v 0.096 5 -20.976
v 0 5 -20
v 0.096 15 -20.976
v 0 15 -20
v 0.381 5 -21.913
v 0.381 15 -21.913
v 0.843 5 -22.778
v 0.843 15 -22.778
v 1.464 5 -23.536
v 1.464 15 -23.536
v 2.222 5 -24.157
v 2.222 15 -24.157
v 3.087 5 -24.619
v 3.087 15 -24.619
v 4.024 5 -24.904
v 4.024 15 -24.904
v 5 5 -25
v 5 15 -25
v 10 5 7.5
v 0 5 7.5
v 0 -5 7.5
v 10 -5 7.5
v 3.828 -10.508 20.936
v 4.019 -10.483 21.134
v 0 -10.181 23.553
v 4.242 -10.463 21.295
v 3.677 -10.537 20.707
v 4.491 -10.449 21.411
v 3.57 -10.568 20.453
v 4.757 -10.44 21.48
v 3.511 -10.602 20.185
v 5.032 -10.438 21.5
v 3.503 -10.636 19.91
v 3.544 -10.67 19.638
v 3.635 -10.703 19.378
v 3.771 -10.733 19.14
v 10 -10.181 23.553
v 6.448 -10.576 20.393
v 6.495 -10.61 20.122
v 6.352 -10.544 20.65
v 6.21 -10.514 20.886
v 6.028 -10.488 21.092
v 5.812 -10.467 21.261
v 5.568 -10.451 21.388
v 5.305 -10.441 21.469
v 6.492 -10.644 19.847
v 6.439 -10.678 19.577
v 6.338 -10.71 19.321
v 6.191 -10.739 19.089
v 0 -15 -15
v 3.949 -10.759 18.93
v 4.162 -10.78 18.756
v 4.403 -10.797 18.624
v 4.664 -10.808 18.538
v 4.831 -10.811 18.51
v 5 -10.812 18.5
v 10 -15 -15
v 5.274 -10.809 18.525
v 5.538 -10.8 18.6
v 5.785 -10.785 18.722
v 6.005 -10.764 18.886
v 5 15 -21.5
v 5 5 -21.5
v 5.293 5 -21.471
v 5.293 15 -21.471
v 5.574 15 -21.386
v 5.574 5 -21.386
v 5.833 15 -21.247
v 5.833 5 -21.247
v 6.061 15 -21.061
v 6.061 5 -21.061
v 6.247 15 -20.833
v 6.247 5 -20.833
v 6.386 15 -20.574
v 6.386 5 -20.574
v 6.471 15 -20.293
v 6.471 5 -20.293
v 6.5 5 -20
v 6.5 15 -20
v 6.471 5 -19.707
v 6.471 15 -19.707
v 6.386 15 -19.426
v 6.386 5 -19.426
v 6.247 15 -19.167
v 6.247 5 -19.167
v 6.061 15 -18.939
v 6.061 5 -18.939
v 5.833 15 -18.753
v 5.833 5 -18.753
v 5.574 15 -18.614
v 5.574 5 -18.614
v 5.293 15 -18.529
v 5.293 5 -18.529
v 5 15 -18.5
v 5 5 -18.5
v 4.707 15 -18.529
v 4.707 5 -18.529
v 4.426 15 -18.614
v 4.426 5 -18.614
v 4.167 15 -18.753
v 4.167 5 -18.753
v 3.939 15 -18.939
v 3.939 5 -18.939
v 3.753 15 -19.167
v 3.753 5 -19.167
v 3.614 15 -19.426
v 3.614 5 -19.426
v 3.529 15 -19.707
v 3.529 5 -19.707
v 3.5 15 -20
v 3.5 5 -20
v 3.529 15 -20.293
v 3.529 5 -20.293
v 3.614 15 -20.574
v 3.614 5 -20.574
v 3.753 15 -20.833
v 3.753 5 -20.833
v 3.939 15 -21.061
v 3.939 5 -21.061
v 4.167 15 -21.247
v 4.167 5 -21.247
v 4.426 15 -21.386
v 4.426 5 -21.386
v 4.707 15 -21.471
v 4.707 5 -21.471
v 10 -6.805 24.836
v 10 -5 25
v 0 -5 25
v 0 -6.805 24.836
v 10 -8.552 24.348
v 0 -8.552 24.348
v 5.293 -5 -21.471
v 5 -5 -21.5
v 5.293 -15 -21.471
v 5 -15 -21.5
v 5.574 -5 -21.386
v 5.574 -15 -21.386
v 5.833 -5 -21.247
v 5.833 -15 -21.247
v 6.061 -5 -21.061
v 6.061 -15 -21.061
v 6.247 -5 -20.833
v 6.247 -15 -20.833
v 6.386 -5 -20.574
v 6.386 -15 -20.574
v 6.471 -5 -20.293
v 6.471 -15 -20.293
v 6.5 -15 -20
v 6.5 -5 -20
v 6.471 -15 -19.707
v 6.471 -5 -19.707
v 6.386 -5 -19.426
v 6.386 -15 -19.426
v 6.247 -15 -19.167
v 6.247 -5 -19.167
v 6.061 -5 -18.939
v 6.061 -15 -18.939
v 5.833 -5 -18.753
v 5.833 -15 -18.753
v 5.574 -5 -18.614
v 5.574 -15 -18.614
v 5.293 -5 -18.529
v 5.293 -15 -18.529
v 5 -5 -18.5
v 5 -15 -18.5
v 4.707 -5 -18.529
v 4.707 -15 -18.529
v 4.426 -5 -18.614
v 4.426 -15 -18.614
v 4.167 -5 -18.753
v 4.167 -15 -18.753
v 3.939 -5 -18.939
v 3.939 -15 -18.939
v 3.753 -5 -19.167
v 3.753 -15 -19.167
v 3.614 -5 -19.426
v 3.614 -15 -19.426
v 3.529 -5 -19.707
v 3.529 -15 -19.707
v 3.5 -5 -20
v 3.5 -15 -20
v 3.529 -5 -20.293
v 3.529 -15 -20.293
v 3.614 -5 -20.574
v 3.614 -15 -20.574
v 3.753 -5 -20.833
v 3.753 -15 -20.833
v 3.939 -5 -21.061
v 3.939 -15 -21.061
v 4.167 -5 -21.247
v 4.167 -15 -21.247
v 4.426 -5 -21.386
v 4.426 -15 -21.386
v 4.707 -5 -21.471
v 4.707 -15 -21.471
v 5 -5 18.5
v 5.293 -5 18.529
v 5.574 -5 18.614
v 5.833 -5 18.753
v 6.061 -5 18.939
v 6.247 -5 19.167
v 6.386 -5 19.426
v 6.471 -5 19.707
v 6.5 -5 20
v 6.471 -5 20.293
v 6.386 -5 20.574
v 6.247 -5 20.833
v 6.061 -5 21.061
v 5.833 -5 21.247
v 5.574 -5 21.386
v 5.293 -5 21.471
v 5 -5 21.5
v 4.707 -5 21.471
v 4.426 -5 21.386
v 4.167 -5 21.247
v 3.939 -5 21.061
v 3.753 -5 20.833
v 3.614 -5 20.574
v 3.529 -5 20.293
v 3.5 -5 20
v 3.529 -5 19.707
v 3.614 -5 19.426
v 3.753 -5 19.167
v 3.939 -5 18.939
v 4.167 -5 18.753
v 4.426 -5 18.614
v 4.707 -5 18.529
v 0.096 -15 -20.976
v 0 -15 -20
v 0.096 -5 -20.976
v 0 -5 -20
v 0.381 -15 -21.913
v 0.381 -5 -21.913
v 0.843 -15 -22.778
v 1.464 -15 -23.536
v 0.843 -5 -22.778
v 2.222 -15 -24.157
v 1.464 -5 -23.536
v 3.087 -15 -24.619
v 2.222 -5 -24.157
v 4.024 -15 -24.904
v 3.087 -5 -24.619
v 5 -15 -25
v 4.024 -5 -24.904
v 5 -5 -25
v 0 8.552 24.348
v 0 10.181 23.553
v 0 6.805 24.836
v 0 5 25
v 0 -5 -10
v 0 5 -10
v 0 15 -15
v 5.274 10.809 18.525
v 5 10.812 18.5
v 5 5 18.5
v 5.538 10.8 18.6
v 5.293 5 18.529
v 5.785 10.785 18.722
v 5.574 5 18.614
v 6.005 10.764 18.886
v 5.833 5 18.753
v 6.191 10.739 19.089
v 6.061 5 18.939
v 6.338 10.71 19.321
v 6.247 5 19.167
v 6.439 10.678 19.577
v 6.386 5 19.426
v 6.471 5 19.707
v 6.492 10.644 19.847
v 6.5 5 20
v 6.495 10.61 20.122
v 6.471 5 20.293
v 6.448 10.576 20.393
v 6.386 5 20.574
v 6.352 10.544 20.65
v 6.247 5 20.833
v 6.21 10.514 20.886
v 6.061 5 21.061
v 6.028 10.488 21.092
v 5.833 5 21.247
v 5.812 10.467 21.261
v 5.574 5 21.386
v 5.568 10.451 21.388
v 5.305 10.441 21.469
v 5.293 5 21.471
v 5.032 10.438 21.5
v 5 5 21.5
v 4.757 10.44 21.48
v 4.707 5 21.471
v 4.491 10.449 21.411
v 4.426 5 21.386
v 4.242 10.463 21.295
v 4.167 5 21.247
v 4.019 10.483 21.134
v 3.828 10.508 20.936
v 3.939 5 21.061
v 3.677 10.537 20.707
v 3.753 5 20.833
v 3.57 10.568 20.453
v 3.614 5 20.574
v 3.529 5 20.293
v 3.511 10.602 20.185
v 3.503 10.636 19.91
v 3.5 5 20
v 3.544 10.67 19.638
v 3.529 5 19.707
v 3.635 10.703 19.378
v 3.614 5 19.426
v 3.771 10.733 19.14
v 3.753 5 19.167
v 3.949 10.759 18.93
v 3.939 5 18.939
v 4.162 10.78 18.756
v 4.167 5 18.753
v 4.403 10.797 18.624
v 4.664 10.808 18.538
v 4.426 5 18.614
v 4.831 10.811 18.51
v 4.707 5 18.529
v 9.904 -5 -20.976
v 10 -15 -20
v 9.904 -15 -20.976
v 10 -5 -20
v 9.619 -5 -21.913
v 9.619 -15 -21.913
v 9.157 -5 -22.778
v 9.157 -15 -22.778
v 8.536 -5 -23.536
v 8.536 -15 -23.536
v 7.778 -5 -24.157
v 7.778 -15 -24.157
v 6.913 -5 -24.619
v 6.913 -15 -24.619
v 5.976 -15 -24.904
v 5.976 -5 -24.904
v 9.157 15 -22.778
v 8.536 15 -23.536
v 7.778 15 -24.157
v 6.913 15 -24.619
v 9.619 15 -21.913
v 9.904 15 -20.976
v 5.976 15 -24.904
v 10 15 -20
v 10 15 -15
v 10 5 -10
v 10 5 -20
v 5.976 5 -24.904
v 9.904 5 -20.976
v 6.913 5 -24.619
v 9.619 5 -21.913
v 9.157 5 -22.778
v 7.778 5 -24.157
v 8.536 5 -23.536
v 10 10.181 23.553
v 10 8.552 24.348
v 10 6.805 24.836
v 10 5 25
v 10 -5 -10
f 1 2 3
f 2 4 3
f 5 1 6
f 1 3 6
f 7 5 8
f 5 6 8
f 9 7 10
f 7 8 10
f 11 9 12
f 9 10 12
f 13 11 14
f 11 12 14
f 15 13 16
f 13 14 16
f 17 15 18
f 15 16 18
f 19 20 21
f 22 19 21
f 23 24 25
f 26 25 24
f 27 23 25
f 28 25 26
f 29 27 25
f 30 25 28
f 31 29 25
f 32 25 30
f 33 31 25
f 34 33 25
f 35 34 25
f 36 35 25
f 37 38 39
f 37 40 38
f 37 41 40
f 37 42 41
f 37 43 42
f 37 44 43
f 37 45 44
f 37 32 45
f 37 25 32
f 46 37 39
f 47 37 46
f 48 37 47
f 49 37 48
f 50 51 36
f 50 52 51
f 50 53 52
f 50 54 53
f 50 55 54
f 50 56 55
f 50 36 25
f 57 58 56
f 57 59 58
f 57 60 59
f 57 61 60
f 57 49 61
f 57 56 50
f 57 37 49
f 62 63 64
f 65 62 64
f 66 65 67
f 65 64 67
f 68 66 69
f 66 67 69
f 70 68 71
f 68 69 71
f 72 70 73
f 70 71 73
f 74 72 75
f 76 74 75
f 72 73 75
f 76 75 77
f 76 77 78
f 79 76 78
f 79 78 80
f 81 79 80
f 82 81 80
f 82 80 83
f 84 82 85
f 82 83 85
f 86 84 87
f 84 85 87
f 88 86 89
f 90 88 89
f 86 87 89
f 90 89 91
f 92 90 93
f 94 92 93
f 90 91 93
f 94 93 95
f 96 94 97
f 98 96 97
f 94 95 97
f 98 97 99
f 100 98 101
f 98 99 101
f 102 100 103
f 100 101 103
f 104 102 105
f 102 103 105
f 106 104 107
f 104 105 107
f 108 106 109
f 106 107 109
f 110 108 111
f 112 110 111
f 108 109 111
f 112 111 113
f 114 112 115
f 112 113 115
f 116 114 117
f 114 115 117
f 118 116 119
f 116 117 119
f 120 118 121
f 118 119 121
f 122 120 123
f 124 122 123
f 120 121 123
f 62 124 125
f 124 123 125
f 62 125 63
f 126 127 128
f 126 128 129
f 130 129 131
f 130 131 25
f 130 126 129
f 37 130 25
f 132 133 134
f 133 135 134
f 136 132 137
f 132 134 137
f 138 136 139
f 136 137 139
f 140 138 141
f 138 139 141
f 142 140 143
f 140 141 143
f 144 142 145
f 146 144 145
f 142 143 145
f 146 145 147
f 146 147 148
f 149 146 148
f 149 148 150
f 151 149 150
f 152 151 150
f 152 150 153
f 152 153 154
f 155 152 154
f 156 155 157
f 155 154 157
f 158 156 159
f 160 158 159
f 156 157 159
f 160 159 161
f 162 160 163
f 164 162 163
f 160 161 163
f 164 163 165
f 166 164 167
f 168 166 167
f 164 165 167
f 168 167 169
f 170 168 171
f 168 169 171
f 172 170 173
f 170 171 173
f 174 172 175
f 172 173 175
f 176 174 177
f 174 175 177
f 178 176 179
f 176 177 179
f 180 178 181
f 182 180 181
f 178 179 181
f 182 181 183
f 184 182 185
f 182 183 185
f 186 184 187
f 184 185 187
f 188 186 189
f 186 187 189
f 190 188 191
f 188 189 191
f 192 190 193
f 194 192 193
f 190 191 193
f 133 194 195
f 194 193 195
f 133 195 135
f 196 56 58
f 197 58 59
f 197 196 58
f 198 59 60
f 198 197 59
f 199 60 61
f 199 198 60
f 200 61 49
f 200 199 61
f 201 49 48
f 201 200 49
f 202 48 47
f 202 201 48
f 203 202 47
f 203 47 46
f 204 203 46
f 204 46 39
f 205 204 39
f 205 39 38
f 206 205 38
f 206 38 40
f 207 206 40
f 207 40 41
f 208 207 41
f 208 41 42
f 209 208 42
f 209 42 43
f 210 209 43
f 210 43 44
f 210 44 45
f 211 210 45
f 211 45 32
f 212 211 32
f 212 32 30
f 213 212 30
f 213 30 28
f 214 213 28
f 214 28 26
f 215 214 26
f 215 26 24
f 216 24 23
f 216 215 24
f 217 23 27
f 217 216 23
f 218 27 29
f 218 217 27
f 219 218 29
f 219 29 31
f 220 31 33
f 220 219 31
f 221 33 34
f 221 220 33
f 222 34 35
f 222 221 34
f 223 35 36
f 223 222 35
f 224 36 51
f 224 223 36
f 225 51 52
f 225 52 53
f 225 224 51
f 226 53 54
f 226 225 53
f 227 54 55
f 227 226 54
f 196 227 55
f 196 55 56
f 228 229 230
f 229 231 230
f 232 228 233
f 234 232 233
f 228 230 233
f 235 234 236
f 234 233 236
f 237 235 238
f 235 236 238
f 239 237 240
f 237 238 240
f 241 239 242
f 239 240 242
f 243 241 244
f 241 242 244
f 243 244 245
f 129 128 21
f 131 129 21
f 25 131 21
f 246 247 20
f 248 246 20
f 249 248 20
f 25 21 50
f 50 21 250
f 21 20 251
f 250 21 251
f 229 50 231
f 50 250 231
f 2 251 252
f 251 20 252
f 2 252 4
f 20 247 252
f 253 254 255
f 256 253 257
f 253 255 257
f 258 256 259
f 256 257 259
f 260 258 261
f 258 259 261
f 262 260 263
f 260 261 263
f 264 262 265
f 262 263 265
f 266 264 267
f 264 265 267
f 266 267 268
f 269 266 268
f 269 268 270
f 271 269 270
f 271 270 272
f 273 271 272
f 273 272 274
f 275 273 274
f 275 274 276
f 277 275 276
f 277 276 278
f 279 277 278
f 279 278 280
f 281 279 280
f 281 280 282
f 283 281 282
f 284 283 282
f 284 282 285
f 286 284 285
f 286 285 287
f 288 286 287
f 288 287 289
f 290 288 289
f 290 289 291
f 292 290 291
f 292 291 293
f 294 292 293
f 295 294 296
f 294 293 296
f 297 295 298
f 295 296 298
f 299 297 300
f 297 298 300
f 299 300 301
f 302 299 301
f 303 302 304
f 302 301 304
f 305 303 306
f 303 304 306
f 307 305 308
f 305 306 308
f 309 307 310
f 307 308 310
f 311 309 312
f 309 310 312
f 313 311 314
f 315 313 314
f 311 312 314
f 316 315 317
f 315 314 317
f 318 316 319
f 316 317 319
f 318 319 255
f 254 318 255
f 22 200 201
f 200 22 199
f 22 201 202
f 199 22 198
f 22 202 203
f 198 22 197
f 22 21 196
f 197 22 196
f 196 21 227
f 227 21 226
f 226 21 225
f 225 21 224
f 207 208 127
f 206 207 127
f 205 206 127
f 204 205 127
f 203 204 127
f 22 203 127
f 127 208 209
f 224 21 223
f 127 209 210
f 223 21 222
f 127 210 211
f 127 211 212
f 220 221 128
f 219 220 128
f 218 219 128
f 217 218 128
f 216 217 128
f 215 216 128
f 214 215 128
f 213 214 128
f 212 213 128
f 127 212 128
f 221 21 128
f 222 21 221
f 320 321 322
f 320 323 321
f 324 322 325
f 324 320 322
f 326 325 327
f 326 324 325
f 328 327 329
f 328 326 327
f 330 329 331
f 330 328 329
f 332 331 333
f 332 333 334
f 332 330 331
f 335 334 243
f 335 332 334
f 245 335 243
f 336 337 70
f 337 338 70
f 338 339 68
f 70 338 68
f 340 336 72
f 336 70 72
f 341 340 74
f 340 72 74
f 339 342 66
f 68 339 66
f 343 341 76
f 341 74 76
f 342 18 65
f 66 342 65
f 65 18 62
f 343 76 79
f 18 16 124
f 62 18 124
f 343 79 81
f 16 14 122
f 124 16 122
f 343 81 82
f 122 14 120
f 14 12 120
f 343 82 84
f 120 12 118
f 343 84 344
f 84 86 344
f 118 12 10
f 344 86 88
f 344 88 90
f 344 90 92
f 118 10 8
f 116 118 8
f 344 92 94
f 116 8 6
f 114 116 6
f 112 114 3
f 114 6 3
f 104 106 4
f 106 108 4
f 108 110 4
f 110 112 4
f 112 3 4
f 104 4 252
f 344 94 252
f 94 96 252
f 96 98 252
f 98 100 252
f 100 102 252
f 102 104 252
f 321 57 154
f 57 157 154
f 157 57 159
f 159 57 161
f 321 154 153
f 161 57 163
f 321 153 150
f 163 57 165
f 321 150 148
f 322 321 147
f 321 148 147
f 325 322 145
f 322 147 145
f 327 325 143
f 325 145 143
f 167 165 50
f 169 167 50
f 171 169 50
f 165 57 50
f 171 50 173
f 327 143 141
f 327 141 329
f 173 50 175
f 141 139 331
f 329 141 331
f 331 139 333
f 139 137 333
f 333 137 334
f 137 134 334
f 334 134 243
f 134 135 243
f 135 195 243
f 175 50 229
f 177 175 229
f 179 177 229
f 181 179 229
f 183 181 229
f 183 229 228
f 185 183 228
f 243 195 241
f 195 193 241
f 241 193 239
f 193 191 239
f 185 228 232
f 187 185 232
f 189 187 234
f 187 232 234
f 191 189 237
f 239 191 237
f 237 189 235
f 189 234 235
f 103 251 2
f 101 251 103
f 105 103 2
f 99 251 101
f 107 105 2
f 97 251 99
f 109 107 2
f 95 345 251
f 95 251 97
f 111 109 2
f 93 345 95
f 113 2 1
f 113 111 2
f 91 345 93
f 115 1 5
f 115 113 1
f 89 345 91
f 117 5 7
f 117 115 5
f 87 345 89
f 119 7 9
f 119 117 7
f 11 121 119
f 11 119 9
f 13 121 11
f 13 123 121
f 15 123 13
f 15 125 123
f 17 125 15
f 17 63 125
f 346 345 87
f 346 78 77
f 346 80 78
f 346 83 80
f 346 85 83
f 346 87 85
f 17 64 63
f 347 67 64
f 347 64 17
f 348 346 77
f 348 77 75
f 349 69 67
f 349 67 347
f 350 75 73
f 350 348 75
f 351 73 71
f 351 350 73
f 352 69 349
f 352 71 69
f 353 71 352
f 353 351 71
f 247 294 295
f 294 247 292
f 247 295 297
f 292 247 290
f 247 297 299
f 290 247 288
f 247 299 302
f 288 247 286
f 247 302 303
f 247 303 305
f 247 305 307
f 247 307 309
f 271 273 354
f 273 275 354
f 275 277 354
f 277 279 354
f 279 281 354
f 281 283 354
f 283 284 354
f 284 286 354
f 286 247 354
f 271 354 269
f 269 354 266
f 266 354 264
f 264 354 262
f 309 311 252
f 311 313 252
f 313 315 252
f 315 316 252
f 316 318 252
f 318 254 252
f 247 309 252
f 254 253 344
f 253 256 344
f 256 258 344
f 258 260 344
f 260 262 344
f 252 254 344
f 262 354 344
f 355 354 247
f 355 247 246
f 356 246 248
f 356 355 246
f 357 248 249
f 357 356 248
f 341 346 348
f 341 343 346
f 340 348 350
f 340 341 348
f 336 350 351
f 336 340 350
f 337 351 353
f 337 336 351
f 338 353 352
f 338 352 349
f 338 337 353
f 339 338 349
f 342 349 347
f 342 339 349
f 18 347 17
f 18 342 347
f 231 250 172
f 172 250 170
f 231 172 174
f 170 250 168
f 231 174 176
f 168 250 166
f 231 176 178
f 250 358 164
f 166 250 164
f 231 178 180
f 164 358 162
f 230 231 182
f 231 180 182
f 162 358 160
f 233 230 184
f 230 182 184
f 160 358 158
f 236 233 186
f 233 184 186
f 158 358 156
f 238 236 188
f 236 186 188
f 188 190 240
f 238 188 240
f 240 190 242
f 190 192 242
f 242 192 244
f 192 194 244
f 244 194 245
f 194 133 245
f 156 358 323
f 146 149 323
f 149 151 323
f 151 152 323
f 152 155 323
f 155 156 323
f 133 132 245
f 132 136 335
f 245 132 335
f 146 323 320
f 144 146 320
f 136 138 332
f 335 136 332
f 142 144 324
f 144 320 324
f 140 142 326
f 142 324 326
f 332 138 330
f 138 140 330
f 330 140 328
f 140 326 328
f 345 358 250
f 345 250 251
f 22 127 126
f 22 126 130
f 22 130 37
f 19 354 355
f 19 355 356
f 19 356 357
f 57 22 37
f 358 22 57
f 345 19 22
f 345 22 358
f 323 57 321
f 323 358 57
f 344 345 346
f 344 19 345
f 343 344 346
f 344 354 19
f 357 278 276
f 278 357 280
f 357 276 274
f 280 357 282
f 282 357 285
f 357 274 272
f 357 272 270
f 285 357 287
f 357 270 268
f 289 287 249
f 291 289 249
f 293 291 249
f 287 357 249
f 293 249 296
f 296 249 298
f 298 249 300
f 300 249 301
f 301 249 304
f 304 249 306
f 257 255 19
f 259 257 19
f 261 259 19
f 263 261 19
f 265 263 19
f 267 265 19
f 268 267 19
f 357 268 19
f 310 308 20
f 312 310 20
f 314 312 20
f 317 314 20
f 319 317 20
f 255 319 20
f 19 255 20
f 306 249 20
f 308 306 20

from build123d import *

# Parameters (mm, degrees)
SALIENTE_EXTRUIR1_DEPTH = 10
REDONDEO4_R             = 10
CROQUIS2_R              = 1.5
CORTAR_EXTRUIR1_DEPTH   = 24
CROQUIS3_W              = 15
CROQUIS3_H              = 10
CORTAR_EXTRUIR2_DEPTH   = 48
REDONDEO6_R             = 5
CORTAR_EXTRUIR3_DEPTH   = 10


with BuildPart() as part:
    # Croquis1 → Saliente-Extruir1 (new body)
    with BuildSketch(Plane(origin=(0, 0, 0), x_dir=(0, 0, -1), z_dir=(1, 0, 0))):
        Polygon((-7.5, 5), (-7.5, -5), (-25, -5), (-25, -15), (25, -15), (25, -5), (25, 5), (25, 15), (-25, 15), (-25, 5), align=None)
    extrude(amount=SALIENTE_EXTRUIR1_DEPTH)

    # Redondeo4
    redondeo4_edges = [part.edges().sort_by_distance(p)[0] for p in [
        (5, 15, 25),
        (5, -15, 25),
    ]]
    fillet(redondeo4_edges, radius=REDONDEO4_R - 0.0001)  # a hair under: the kernel refuses the full size

    # Croquis2 → Cortar-Extruir1 (cut, symmetric)
    with BuildSketch(Plane.XZ.offset(-5)):
        with Locations(Location((5, 20, 0), (0, 0, 270))):
            Circle(CROQUIS2_R)
        with Locations(Location((5, -20, 0), (0, 0, 270))):
            Circle(CROQUIS2_R)
    extrude(amount=CORTAR_EXTRUIR1_DEPTH, both=True, mode=Mode.SUBTRACT)

    # Croquis3 → Cortar-Extruir2 (cut)
    with BuildSketch(Plane(origin=(10, 0, 0), x_dir=(0, 0, -1), z_dir=(1, 0, 0))):
        with Locations((17.5, 0)):
            Rectangle(CROQUIS3_W, CROQUIS3_H)
    extrude(amount=-CORTAR_EXTRUIR2_DEPTH, mode=Mode.SUBTRACT)

    # Redondeo6
    redondeo6_edges = [part.edges().sort_by_distance(p)[0] for p in [
        (10, 10, -25),
        (0, 10, -25),
        (10, -10, -25),
        (0, -10, -25),
    ]]
    fillet(redondeo6_edges, radius=REDONDEO6_R - 0.0001)  # a hair under: the kernel refuses the full size

    # Croquis4 → Cortar-Extruir3 (cut)
    with BuildSketch(Plane(origin=(10, 0, 0), x_dir=(0, 0, -1), z_dir=(1, 0, 0))):
        Polygon((-25, 10), (15, 15), (-25, 17.816893643), align=None)
        Polygon((-25, -10), (15, -15), (-25, -17.816893643), align=None)
    extrude(amount=-CORTAR_EXTRUIR3_DEPTH, mode=Mode.SUBTRACT)


solid = part.part
